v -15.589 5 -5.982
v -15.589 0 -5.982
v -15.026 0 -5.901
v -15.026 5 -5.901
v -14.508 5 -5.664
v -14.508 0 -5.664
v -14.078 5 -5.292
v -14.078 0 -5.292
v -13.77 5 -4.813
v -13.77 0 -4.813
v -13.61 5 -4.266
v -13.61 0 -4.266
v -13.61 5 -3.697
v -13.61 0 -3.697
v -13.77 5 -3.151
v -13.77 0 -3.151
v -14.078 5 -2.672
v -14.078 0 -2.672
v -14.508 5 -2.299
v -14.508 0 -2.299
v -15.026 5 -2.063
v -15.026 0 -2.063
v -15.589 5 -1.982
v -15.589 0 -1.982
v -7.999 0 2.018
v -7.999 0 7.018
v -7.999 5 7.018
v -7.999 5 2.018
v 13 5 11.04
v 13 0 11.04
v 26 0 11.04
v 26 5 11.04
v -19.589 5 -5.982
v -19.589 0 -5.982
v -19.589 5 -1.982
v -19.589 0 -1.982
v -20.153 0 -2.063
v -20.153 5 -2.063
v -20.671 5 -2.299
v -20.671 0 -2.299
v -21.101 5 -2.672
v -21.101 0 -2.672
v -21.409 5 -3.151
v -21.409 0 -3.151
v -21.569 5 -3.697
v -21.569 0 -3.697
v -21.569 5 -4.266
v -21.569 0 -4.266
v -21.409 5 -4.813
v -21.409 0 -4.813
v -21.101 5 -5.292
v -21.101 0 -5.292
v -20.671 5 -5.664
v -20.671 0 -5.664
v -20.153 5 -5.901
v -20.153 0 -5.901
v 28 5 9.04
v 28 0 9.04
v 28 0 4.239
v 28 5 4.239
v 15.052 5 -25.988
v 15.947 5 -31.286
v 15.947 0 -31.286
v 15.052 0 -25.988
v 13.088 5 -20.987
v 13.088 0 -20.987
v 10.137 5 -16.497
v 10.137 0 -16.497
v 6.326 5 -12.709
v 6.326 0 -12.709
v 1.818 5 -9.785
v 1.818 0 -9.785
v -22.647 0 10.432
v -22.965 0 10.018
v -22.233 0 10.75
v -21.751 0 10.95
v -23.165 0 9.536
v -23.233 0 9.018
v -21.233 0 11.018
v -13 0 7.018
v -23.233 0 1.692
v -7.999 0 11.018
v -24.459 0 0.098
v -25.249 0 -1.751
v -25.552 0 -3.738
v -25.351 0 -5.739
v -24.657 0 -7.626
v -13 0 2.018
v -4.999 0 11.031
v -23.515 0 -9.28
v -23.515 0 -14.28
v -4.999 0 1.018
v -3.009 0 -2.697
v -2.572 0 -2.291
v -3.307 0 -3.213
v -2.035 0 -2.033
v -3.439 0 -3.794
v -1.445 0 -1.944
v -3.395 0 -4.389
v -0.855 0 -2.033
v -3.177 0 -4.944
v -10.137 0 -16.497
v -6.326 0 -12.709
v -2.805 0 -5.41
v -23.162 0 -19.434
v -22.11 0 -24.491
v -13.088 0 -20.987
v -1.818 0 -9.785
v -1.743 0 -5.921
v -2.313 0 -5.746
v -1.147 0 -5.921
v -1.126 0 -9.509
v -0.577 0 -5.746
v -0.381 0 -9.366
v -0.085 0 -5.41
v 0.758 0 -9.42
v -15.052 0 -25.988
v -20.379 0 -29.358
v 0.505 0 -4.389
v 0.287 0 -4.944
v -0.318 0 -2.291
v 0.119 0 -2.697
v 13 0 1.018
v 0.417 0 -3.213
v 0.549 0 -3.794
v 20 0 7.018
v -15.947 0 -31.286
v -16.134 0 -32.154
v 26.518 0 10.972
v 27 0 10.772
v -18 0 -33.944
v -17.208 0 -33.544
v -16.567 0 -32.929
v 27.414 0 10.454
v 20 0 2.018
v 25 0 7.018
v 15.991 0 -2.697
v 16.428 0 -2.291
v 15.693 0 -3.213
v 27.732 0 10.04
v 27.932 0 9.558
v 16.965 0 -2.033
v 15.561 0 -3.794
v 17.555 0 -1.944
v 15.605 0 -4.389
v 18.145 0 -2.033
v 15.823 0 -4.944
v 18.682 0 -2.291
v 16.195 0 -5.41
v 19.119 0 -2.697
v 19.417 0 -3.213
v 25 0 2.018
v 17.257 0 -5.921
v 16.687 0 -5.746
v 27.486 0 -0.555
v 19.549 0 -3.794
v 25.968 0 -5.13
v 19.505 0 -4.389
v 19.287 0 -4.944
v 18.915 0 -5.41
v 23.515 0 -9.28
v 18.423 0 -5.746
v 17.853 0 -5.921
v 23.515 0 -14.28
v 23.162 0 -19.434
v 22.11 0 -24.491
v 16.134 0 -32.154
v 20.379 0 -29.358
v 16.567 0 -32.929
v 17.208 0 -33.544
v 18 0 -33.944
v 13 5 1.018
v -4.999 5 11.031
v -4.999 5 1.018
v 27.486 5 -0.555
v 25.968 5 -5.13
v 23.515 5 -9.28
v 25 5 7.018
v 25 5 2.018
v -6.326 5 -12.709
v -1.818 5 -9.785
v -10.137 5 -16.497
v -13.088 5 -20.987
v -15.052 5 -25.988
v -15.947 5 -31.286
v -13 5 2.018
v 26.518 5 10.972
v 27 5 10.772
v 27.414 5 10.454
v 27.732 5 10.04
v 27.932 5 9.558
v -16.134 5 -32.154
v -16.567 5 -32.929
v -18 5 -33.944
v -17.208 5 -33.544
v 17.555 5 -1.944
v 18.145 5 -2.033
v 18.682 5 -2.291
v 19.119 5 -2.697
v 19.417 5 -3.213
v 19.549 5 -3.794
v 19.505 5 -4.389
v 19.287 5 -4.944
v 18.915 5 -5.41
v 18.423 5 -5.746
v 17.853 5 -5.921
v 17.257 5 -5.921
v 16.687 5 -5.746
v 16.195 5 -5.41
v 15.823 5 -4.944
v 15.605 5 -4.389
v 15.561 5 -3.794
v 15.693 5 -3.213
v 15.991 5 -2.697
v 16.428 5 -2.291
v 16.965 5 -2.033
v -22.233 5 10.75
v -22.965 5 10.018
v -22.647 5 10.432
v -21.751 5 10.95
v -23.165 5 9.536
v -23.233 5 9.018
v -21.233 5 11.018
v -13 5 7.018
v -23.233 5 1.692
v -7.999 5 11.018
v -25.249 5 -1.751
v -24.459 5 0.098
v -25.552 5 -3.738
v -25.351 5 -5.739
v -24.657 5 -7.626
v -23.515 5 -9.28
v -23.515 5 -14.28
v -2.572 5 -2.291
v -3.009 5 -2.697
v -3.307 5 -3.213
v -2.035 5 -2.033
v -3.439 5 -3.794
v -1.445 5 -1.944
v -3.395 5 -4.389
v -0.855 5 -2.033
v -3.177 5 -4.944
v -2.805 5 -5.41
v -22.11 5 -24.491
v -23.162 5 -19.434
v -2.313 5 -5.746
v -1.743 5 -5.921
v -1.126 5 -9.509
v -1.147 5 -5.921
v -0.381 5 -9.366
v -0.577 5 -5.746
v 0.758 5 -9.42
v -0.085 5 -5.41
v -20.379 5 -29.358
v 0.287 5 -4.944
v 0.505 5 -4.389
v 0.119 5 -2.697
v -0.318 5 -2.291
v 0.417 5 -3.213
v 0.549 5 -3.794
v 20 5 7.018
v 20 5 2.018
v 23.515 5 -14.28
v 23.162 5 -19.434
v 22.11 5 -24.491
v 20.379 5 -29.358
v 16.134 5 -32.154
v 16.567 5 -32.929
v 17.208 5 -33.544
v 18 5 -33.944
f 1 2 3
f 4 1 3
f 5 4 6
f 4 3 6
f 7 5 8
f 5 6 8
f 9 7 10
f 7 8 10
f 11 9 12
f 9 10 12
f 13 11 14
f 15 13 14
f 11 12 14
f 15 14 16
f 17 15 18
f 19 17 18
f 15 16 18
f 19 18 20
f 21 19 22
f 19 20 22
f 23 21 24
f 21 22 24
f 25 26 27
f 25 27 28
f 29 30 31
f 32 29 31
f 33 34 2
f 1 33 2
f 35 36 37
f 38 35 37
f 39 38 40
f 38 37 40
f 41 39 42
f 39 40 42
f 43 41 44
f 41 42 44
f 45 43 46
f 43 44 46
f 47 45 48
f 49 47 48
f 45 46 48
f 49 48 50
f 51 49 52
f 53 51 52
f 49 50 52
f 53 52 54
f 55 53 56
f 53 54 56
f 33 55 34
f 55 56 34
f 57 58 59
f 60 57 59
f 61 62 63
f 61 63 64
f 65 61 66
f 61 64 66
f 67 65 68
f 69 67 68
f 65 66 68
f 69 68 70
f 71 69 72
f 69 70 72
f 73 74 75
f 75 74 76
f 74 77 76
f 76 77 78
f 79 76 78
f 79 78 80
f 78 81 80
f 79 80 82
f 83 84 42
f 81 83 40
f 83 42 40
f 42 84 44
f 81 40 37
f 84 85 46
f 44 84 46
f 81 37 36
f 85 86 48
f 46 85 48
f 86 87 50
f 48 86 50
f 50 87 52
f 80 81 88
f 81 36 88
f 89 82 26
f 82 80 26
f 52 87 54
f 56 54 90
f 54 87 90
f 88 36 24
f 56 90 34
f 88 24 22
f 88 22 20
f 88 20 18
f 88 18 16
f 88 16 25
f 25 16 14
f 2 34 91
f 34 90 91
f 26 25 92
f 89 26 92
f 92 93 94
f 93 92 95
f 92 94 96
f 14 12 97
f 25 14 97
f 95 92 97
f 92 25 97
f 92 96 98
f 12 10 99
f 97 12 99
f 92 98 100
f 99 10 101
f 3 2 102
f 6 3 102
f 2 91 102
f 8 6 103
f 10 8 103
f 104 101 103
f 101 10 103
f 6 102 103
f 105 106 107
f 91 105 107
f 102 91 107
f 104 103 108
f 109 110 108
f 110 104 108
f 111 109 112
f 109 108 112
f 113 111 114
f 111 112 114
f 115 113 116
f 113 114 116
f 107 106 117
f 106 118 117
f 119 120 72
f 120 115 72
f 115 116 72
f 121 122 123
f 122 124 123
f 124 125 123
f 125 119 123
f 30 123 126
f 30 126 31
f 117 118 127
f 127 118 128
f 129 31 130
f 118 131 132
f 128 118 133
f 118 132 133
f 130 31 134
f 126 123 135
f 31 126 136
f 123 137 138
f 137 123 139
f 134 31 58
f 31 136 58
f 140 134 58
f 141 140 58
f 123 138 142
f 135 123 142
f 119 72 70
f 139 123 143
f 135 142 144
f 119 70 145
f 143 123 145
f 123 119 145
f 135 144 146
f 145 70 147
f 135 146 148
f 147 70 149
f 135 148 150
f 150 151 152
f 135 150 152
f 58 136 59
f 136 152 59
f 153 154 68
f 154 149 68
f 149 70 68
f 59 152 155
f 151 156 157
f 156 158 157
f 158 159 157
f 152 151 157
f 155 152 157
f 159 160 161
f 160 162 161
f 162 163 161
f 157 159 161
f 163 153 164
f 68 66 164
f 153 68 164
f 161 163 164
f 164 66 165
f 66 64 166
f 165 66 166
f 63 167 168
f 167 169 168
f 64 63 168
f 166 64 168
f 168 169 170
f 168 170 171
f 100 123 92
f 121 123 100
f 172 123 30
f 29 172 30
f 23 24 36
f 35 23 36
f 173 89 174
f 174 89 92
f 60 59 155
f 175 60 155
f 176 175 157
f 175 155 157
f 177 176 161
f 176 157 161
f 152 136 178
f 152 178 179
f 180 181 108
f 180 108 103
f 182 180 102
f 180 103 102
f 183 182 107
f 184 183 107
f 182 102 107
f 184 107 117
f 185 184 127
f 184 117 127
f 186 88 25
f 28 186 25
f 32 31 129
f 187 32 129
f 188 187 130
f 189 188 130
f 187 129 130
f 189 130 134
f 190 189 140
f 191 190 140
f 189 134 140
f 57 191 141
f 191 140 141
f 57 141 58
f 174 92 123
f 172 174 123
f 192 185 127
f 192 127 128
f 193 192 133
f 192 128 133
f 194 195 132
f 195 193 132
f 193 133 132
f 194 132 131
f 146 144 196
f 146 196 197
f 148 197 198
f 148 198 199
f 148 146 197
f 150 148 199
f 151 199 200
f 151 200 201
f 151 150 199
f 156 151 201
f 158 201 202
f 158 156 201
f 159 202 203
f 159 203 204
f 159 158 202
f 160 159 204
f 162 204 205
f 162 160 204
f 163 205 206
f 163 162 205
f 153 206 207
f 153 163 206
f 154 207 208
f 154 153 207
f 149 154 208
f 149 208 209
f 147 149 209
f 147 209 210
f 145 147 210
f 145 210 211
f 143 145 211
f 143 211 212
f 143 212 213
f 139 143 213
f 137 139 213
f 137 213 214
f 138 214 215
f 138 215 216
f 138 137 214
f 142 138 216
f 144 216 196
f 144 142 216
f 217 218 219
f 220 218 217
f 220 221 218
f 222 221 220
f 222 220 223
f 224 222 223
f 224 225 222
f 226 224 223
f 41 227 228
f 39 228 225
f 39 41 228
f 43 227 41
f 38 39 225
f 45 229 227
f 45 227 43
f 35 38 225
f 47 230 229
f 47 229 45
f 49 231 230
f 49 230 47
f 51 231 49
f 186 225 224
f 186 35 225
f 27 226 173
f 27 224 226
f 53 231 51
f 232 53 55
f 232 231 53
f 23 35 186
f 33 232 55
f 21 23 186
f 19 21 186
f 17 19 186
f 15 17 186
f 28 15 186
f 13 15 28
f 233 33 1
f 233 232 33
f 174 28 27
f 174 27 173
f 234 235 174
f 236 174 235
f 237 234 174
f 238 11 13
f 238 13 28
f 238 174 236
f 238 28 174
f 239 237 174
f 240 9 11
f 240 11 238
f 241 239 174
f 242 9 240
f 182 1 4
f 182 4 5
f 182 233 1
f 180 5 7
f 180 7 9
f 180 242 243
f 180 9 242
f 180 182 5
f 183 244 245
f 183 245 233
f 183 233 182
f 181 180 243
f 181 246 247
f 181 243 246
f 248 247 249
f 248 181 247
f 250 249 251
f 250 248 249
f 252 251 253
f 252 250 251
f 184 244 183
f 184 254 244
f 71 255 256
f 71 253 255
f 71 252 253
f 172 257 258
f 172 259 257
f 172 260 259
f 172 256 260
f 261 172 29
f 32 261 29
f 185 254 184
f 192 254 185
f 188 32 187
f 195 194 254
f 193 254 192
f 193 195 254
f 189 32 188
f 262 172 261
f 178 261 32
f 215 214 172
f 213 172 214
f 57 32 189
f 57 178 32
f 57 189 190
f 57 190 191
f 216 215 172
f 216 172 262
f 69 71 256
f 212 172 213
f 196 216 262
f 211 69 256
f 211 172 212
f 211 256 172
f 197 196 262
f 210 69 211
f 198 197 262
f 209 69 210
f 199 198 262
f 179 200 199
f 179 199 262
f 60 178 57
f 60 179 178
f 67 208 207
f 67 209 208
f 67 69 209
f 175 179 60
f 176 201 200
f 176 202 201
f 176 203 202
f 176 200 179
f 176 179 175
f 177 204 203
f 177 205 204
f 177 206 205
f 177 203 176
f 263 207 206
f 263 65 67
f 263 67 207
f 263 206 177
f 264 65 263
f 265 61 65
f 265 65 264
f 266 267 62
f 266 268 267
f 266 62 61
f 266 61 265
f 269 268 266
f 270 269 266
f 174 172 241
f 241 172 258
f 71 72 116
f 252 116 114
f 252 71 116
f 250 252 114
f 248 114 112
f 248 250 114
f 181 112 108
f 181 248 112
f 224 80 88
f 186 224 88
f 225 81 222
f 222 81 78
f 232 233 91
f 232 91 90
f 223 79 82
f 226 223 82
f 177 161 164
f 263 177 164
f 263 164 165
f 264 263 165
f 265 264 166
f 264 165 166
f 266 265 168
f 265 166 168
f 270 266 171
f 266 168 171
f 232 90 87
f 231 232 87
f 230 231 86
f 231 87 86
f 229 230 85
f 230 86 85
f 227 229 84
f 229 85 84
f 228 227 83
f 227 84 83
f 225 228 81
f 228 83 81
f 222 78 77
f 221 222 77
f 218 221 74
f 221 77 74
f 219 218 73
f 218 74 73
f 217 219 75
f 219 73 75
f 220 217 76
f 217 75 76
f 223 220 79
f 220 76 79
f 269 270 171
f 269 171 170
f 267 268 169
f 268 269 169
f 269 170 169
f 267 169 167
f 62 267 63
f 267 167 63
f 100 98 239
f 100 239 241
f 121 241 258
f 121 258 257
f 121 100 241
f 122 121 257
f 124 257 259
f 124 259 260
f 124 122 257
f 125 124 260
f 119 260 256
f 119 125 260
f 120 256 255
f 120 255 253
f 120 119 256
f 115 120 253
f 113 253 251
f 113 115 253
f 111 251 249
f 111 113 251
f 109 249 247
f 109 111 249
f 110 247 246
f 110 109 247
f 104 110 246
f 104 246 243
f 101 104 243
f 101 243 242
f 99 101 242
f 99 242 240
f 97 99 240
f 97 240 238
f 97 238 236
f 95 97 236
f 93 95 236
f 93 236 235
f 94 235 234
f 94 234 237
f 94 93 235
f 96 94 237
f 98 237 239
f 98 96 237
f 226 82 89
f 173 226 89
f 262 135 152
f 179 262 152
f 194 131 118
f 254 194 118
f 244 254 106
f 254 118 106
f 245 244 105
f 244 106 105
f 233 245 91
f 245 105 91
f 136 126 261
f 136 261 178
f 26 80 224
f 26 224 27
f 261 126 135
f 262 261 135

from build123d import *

# Parameters (mm, degrees)
SKETCH1_W           = 5.001317171
SKETCH1_H           = 5
SKETCH1_R           = 2
SKETCH1_W_2         = 5
BOSS_EXTRUDE1_DEPTH = 5
FILLET1_R           = 4
FILLET2_R           = 3
FILLET3_R           = 3


with BuildPart() as part:
    # Sketch1 → Boss-Extrude1 (new body)
    with BuildSketch(Plane(origin=(0, 0, 0), x_dir=(1, 0, 0), z_dir=(0, 1, 0))):
        with BuildLine():
            Line((18, 33.943656531), (16, 33.943656531))
            Line((16, 33.943656531), (16, 32.943656531))
            ThreePointArc((16, 32.943656531), (11.633307653, 18.521451429), (0, 8.943656531))
            ThreePointArc((0, 8.943656531), (-11.633307653, 18.521451429), (-16, 32.943656531))
            Line((-16, 32.943656531), (-16, 33.943656531))
            Line((-16, 33.943656531), (-18, 33.943656531))
            ThreePointArc((-18, 33.943656531), (-22.110006153, 24.491379681), (-23.514801823, 14.280393571))
            Line((-23.514801823, 14.280393571), (-23.514801823, 9.280393571))
            ThreePointArc((-23.514801823, 9.280393571), (-25.552366673, 3.738409631), (-23.233209016, -1.691762031))
            Line((-23.233209016, -1.691762031), (-23.233209016, -9.018158061))
            ThreePointArc((-23.233209016, -9.018158061), (-22.647422579, -10.432371623), (-21.233209016, -11.018158061))
            Line((-21.233209016, -11.018158061), (-13, -11.018158061))
            Line((-13, -11.018158061), (-7.998682829, -11.018158061))
            Line((-7.998682829, -11.018158061), (-4.998682829, -11.0314348))
            Line((-4.998682829, -11.0314348), (-4.998682829, -1.018158061))
            Line((-4.998682829, -1.018158061), (-2.998682829, -1.018158061))
            Line((-2.998682829, -1.018158061), (13, -1.018158061))
            Line((13, -1.018158061), (13, -11.04028596))
            Line((13, -11.04028596), (26, -11.04028596))
            ThreePointArc((26, -11.04028596), (27.414213562, -10.454499522), (28, -9.04028596))
            Line((28, -9.04028596), (28, -4.239034491))
            ThreePointArc((28, -4.239034491), (26.849436145, 2.882972561), (23.514801823, 9.280393571))
            Line((23.514801823, 9.280393571), (23.514801823, 14.280393571))
            ThreePointArc((23.514801823, 14.280393571), (22.110006153, 24.491379681), (18, 33.943656531))
        make_face()
        with Locations((-10.499341414, -4.518158061)):
            Rectangle(SKETCH1_W, SKETCH1_H, mode=Mode.SUBTRACT)
        with BuildLine():
            ThreePointArc((-19.589388553, 1.981841939), (-21.589388553, 3.981841939), (-19.589388553, 5.981841939))
            Line((-19.589388553, 5.981841939), (-15.589388553, 5.981841939))
            ThreePointArc((-15.589388553, 5.981841939), (-13.589388553, 3.981841939), (-15.589388553, 1.981841939))
            Line((-15.589388553, 1.981841939), (-19.589388553, 1.981841939))
        make_face(mode=Mode.SUBTRACT)
        with Locations(Location((-1.445, 3.943656531, 0), (0, 0, 270))):
            Circle(SKETCH1_R, mode=Mode.SUBTRACT)
        with Locations((22.5, -4.518158061)):
            Rectangle(SKETCH1_W_2, SKETCH1_H, mode=Mode.SUBTRACT)
        with Locations(Location((17.555, 3.943656531, 0), (0, 0, 270))):
            Circle(SKETCH1_R, mode=Mode.SUBTRACT)
    extrude(amount=BOSS_EXTRUDE1_DEPTH)

    # Fillet1
    fillet1_edges = [part.edges().sort_by_distance(p)[0] for p in [
        (0, 2.5, -8.943656531),
    ]]
    fillet(fillet1_edges, radius=FILLET1_R)

    # Fillet2
    # the kernel refuses this fillet: 3 mm, written as the material it takes off along each edge
    with BuildSketch(Plane(origin=(16, -6.644712065, -33.943656531), x_dir=(-0.019894609369720543, 0, 0.999802082673379), z_dir=(0, 1, 0))) as fillet2_piece_1:
        with BuildLine():
            CenterArc((2.789518237, 2.997110716), FILLET2_R, 199.420718405, 68.064461233)
            Line((-0.039789219, 1.999604165), (-0.322719964, 1.89985351))
            ThreePointArc((-0.322719964, 1.89985351), (-0.319835234, 0.9938337), (-0.299940625, -0.005968383))
            Line((-0.299940625, -0.005968383), (0.005968383, -0.299940625))
            ThreePointArc((0.005968383, -0.299940625), (1.005770465, -0.280046015), (2.644721485, -0.299711072))
            Line((2.644721485, -0.299711072), (2.657884826, 0))
        make_face()
    extrude(amount=18.289424129, mode=Mode.SUBTRACT)

    # Fillet3
    # the kernel refuses this fillet: 3 mm, written as the material it takes off along each edge
    with BuildSketch(Plane(origin=(-16, -6.644712065, -33.943656531), x_dir=(-1, 0, 0), z_dir=(0, 1, 0))) as fillet3_piece_1:
        with BuildLine():
            CenterArc((2.94102116, 2.84859249), FILLET3_R, 183.654772721, 68.064461233)
            Line((-0.05287758, 2.657358784), (-0.352267454, 2.638235414))
            ThreePointArc((-0.352267454, 2.638235414), (-0.3, 1), (-0.3, 0))
            Line((-0.3, 0), (0, -0.3))
            ThreePointArc((0, -0.3), (1, -0.3), (1.905897884, -0.284859249))
            Line((1.905897884, -0.284859249), (2, 0))
        make_face()
    extrude(amount=18.289424129, mode=Mode.SUBTRACT)


solid = part.part
